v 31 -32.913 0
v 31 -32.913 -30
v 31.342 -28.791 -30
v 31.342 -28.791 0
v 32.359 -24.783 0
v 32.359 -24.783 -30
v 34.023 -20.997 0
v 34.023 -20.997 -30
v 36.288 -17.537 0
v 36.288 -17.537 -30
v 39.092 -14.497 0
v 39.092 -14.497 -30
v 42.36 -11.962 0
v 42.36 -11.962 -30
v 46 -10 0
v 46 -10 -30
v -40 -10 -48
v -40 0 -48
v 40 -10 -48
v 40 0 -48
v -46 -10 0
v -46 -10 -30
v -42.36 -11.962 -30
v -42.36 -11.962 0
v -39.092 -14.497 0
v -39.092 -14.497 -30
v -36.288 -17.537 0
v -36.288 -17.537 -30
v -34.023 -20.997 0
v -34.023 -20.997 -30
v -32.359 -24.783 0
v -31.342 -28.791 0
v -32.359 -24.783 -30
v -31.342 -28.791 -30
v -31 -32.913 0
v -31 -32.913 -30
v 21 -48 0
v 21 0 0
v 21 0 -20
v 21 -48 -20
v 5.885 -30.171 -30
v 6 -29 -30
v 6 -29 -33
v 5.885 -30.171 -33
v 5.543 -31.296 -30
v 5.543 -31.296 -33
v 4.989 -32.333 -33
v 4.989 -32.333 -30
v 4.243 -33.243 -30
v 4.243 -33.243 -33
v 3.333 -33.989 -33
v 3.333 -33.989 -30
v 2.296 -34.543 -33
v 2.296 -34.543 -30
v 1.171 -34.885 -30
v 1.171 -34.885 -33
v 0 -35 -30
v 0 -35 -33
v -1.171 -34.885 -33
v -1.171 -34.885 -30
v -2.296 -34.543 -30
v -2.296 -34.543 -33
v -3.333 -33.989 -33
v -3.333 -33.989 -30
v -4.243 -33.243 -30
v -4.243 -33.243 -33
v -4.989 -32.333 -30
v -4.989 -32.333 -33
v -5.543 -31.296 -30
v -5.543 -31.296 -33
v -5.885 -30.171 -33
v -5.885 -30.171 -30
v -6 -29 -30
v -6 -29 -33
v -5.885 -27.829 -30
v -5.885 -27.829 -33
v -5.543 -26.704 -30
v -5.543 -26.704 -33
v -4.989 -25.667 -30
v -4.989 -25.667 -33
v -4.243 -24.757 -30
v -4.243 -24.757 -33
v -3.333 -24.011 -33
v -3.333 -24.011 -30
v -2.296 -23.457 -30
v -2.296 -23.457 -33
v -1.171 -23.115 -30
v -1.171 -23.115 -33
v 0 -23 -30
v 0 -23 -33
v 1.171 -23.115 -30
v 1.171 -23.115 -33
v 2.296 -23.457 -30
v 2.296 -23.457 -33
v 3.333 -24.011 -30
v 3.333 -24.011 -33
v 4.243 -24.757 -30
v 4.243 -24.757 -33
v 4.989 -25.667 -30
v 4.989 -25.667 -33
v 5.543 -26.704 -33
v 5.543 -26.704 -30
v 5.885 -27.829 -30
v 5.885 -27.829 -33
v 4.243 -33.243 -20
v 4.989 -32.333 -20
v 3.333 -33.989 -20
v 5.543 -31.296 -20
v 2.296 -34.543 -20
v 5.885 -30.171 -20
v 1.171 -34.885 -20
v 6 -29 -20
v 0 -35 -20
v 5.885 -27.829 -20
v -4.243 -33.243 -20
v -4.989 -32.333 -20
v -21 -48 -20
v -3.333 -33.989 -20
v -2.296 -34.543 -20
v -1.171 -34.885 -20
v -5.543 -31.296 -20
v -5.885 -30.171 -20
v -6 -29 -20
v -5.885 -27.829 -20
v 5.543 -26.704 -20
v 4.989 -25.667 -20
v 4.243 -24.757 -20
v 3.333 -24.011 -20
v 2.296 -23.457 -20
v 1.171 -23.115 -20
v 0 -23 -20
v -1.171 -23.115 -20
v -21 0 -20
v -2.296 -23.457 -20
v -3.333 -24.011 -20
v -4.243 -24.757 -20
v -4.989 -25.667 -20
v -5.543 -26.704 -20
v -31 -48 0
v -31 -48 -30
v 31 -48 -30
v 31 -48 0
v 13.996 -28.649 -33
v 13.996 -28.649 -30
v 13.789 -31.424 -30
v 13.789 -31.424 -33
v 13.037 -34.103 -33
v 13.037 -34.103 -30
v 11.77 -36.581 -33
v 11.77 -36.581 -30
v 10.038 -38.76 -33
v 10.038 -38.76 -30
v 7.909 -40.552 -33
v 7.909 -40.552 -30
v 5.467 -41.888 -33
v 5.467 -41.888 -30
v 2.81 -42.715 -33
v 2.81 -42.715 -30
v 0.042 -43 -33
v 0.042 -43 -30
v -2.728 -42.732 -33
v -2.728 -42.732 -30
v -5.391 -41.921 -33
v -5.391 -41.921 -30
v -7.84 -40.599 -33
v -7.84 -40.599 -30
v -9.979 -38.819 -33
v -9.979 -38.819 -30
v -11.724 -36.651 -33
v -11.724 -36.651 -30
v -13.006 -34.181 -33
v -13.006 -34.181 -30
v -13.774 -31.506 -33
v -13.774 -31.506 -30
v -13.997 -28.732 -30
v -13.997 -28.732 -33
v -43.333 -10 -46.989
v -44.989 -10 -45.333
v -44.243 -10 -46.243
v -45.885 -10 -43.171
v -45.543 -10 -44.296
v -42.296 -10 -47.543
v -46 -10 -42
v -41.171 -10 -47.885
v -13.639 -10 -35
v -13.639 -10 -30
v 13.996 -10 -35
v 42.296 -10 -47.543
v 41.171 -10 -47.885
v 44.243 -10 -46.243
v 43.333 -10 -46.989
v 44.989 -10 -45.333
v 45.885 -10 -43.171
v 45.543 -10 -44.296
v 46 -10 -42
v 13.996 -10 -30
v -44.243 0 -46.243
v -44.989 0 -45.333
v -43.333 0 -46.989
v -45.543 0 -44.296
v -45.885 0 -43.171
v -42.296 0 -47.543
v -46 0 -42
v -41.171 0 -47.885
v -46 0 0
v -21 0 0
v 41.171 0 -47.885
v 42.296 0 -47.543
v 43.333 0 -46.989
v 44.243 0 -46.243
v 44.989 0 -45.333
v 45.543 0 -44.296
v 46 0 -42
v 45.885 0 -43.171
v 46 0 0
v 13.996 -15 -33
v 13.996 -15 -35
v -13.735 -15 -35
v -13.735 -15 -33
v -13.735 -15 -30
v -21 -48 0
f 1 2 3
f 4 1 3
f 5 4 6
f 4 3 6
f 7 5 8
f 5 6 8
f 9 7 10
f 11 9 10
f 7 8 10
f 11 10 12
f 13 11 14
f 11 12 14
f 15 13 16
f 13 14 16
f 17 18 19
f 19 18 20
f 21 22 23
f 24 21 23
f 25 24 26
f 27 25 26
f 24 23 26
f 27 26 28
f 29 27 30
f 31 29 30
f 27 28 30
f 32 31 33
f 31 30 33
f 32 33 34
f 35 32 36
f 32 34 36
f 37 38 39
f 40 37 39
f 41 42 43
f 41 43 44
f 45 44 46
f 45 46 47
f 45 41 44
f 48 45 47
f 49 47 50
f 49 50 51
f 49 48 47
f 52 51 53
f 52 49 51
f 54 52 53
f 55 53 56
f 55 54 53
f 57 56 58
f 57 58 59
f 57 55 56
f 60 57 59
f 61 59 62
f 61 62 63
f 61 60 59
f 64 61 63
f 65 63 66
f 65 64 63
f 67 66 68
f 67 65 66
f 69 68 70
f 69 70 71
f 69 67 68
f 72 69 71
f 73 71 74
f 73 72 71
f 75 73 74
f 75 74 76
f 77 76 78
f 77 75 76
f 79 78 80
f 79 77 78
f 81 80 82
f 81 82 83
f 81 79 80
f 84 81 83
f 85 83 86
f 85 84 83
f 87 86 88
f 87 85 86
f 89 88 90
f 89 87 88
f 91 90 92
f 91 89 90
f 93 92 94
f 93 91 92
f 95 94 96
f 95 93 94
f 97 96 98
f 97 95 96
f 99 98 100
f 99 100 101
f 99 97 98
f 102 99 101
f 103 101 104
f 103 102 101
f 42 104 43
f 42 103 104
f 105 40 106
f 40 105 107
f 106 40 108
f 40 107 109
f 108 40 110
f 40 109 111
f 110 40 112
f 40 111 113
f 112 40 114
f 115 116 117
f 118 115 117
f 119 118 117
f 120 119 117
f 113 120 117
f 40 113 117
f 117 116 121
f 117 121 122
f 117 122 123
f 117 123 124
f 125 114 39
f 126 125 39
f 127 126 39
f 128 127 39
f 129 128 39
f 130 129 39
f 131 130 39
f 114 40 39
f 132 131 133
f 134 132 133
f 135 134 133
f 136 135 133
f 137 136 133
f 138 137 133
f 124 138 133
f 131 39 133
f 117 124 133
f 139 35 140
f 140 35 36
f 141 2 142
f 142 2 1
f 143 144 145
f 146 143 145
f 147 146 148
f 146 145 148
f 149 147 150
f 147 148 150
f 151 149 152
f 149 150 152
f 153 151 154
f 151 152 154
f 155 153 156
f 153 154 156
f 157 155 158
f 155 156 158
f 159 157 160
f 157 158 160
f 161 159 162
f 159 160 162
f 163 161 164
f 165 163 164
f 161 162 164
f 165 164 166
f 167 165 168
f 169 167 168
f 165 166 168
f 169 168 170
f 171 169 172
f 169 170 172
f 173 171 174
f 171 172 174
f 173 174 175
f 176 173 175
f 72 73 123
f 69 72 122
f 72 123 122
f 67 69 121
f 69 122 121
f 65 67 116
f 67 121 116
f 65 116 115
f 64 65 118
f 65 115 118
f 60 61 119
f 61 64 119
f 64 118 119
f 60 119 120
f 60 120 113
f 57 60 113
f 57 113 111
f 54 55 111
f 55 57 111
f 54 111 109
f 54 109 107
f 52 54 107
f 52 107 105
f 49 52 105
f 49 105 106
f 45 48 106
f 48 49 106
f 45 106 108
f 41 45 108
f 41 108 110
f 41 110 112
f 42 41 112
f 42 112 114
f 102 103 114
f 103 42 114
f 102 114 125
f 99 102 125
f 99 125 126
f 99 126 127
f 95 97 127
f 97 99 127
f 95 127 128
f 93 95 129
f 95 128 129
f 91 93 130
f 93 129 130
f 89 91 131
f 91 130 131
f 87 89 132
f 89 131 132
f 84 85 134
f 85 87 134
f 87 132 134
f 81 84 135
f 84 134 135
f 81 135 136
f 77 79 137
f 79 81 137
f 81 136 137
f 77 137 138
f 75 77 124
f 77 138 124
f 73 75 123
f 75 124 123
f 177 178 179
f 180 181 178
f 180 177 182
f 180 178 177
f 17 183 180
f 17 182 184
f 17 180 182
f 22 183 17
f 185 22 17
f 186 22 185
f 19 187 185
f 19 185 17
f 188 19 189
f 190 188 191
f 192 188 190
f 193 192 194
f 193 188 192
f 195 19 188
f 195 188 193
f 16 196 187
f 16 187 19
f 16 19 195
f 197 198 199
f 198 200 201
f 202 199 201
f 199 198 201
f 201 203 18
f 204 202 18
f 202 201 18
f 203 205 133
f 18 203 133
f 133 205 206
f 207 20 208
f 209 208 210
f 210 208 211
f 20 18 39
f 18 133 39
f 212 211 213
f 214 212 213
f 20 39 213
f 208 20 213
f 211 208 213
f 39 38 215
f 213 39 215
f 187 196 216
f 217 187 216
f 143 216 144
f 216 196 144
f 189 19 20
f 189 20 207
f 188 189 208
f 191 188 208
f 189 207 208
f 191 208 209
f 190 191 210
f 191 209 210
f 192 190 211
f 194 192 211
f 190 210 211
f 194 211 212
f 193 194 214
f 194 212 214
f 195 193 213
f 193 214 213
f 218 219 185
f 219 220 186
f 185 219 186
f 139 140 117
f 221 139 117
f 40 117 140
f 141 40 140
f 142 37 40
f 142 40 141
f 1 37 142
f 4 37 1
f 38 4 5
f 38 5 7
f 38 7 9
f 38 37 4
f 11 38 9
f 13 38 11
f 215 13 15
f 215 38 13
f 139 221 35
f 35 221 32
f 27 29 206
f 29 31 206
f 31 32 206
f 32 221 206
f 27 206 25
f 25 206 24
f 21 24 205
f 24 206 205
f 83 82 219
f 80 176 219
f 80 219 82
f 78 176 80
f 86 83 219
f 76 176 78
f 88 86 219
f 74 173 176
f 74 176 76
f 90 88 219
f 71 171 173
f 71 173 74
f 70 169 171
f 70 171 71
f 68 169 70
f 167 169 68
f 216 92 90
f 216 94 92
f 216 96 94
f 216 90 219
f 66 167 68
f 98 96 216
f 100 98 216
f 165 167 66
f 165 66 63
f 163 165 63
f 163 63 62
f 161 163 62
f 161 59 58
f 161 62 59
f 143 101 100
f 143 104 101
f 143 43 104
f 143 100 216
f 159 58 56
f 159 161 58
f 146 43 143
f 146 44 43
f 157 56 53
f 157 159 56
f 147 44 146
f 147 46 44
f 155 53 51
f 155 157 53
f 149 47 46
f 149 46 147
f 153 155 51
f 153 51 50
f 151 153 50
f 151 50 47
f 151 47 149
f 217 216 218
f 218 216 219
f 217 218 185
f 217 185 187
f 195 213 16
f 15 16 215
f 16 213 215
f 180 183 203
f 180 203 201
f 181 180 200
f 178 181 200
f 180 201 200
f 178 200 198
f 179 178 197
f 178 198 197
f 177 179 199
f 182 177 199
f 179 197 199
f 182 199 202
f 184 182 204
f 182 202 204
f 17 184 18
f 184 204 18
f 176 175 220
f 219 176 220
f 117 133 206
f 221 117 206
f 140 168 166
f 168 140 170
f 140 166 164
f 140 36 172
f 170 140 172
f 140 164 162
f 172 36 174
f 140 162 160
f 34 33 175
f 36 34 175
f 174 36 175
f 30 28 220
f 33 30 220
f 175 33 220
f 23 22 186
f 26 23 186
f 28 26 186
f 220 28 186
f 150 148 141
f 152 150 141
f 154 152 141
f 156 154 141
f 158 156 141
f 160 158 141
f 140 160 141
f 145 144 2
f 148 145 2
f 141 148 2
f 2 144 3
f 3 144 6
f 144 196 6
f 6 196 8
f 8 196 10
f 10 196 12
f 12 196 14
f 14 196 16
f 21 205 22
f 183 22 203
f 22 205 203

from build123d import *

# Parameters (mm, degrees)
F1_DEPTH    = 48
F2_DEPTH    = 10
F3_R        = 6
F4_DEPTH    = 3
F5_DEPTH    = 5
F6_T1_DEPTH = 30
F7_D        = 12


# Not quite as in the source:
# - a fillet or chamfer that OpenCascade refuses, or shapes differently, is made with other operations: its cross-section is extruded or revolved along the edge and cut away or added


with BuildPart() as f1:
    # F0 (on Front) → F1 (new body)
    with BuildSketch(Plane.XZ):
        Polygon((-21, 0), (-31, 0), (-31, -30), (31, -30), (31, 0), (21, 0), (21, -20), (-21, -20), align=None)
    extrude(amount=F1_DEPTH)

    # F0 (on Front) → F2 (join)
    with BuildSketch(Plane.XZ):
        with BuildLine():
            Line((-31, 0), (-46, 0))
            Line((-46, 0), (-46, -42))
            ThreePointArc((-46, -42), (-44.2426406871, -46.2426406871), (-40, -48))
            Line((-40, -48), (40, -48))
            ThreePointArc((40, -48), (44.2426406871, -46.2426406871), (46, -42))
            Line((46, -42), (46, 0))
            Line((46, 0), (31, 0))
            Line((31, 0), (31, -30))
            Line((31, -30), (-31, -30))
            Line((-31, -30), (-31, 0))
        make_face()
        Polygon((-21, 0), (-31, 0), (-31, -30), (31, -30), (31, 0), (21, 0), (21, -20), (-21, -20), align=None)
    extrude(amount=F2_DEPTH)

    # F3 (on face) → F4 (join)
    with BuildSketch(Plane(origin=(0, 0, -30), x_dir=(1, 0, 0), z_dir=(0, 0, -1))):
        with BuildLine():
            Line((13.9955899146, 15), (13.9955899146, 28.6486270591))
            ThreePointArc((13.9955899146, 28.6486270591), (0.0417417441, 42.9999377722), (-13.9974363474, 28.7320901258))
            Line((-13.9974363474, 28.7320901258), (-13.7346051799, 15))
            Line((-13.7346051799, 15), (13.9955899146, 15))
        make_face()
        with Locations((0, 29)):
            Circle(F3_R, mode=Mode.SUBTRACT)
    extrude(amount=F4_DEPTH)

    # F3 (on face) → F5 (join)
    with BuildSketch(Plane(origin=(0, 0, -30), x_dir=(1, 0, 0), z_dir=(0, 0, -1))):
        Polygon((13.9955899146, 10), (13.9955899146, 15), (-13.7346051799, 15), (-13.6389055576, 10), align=None)
    extrude(amount=F5_DEPTH)

    # F6: fillet of radius 25 on 2 edges, made by hand

    # F6_s2 → F6_t1 (join)
    with BuildSketch(Plane.XY.offset(-30)):
        with BuildLine():
            ThreePointArc((31, -32.9128784748), (35.0834993366, -19.2198145372), (46, -10))
            Line((46, -10), (31, -10))
            Line((31, -10), (31, -32.9128784748))
        make_face()
        with BuildLine():
            ThreePointArc((-46, -10), (-35.0834993366, -19.2198145372), (-31, -32.9128784748))
            Line((-31, -32.9128784748), (-31, -10))
            Line((-31, -10), (-46, -10))
        make_face()
    extrude(amount=F6_T1_DEPTH)

    # F7 (through all)
    with Locations(Plane(origin=(0, 0, -30), x_dir=(1, 0, 0), z_dir=(0, 0, -1))):
        with Locations((0, 29)):
            Hole(F7_D / 2)


solid = f1.part
